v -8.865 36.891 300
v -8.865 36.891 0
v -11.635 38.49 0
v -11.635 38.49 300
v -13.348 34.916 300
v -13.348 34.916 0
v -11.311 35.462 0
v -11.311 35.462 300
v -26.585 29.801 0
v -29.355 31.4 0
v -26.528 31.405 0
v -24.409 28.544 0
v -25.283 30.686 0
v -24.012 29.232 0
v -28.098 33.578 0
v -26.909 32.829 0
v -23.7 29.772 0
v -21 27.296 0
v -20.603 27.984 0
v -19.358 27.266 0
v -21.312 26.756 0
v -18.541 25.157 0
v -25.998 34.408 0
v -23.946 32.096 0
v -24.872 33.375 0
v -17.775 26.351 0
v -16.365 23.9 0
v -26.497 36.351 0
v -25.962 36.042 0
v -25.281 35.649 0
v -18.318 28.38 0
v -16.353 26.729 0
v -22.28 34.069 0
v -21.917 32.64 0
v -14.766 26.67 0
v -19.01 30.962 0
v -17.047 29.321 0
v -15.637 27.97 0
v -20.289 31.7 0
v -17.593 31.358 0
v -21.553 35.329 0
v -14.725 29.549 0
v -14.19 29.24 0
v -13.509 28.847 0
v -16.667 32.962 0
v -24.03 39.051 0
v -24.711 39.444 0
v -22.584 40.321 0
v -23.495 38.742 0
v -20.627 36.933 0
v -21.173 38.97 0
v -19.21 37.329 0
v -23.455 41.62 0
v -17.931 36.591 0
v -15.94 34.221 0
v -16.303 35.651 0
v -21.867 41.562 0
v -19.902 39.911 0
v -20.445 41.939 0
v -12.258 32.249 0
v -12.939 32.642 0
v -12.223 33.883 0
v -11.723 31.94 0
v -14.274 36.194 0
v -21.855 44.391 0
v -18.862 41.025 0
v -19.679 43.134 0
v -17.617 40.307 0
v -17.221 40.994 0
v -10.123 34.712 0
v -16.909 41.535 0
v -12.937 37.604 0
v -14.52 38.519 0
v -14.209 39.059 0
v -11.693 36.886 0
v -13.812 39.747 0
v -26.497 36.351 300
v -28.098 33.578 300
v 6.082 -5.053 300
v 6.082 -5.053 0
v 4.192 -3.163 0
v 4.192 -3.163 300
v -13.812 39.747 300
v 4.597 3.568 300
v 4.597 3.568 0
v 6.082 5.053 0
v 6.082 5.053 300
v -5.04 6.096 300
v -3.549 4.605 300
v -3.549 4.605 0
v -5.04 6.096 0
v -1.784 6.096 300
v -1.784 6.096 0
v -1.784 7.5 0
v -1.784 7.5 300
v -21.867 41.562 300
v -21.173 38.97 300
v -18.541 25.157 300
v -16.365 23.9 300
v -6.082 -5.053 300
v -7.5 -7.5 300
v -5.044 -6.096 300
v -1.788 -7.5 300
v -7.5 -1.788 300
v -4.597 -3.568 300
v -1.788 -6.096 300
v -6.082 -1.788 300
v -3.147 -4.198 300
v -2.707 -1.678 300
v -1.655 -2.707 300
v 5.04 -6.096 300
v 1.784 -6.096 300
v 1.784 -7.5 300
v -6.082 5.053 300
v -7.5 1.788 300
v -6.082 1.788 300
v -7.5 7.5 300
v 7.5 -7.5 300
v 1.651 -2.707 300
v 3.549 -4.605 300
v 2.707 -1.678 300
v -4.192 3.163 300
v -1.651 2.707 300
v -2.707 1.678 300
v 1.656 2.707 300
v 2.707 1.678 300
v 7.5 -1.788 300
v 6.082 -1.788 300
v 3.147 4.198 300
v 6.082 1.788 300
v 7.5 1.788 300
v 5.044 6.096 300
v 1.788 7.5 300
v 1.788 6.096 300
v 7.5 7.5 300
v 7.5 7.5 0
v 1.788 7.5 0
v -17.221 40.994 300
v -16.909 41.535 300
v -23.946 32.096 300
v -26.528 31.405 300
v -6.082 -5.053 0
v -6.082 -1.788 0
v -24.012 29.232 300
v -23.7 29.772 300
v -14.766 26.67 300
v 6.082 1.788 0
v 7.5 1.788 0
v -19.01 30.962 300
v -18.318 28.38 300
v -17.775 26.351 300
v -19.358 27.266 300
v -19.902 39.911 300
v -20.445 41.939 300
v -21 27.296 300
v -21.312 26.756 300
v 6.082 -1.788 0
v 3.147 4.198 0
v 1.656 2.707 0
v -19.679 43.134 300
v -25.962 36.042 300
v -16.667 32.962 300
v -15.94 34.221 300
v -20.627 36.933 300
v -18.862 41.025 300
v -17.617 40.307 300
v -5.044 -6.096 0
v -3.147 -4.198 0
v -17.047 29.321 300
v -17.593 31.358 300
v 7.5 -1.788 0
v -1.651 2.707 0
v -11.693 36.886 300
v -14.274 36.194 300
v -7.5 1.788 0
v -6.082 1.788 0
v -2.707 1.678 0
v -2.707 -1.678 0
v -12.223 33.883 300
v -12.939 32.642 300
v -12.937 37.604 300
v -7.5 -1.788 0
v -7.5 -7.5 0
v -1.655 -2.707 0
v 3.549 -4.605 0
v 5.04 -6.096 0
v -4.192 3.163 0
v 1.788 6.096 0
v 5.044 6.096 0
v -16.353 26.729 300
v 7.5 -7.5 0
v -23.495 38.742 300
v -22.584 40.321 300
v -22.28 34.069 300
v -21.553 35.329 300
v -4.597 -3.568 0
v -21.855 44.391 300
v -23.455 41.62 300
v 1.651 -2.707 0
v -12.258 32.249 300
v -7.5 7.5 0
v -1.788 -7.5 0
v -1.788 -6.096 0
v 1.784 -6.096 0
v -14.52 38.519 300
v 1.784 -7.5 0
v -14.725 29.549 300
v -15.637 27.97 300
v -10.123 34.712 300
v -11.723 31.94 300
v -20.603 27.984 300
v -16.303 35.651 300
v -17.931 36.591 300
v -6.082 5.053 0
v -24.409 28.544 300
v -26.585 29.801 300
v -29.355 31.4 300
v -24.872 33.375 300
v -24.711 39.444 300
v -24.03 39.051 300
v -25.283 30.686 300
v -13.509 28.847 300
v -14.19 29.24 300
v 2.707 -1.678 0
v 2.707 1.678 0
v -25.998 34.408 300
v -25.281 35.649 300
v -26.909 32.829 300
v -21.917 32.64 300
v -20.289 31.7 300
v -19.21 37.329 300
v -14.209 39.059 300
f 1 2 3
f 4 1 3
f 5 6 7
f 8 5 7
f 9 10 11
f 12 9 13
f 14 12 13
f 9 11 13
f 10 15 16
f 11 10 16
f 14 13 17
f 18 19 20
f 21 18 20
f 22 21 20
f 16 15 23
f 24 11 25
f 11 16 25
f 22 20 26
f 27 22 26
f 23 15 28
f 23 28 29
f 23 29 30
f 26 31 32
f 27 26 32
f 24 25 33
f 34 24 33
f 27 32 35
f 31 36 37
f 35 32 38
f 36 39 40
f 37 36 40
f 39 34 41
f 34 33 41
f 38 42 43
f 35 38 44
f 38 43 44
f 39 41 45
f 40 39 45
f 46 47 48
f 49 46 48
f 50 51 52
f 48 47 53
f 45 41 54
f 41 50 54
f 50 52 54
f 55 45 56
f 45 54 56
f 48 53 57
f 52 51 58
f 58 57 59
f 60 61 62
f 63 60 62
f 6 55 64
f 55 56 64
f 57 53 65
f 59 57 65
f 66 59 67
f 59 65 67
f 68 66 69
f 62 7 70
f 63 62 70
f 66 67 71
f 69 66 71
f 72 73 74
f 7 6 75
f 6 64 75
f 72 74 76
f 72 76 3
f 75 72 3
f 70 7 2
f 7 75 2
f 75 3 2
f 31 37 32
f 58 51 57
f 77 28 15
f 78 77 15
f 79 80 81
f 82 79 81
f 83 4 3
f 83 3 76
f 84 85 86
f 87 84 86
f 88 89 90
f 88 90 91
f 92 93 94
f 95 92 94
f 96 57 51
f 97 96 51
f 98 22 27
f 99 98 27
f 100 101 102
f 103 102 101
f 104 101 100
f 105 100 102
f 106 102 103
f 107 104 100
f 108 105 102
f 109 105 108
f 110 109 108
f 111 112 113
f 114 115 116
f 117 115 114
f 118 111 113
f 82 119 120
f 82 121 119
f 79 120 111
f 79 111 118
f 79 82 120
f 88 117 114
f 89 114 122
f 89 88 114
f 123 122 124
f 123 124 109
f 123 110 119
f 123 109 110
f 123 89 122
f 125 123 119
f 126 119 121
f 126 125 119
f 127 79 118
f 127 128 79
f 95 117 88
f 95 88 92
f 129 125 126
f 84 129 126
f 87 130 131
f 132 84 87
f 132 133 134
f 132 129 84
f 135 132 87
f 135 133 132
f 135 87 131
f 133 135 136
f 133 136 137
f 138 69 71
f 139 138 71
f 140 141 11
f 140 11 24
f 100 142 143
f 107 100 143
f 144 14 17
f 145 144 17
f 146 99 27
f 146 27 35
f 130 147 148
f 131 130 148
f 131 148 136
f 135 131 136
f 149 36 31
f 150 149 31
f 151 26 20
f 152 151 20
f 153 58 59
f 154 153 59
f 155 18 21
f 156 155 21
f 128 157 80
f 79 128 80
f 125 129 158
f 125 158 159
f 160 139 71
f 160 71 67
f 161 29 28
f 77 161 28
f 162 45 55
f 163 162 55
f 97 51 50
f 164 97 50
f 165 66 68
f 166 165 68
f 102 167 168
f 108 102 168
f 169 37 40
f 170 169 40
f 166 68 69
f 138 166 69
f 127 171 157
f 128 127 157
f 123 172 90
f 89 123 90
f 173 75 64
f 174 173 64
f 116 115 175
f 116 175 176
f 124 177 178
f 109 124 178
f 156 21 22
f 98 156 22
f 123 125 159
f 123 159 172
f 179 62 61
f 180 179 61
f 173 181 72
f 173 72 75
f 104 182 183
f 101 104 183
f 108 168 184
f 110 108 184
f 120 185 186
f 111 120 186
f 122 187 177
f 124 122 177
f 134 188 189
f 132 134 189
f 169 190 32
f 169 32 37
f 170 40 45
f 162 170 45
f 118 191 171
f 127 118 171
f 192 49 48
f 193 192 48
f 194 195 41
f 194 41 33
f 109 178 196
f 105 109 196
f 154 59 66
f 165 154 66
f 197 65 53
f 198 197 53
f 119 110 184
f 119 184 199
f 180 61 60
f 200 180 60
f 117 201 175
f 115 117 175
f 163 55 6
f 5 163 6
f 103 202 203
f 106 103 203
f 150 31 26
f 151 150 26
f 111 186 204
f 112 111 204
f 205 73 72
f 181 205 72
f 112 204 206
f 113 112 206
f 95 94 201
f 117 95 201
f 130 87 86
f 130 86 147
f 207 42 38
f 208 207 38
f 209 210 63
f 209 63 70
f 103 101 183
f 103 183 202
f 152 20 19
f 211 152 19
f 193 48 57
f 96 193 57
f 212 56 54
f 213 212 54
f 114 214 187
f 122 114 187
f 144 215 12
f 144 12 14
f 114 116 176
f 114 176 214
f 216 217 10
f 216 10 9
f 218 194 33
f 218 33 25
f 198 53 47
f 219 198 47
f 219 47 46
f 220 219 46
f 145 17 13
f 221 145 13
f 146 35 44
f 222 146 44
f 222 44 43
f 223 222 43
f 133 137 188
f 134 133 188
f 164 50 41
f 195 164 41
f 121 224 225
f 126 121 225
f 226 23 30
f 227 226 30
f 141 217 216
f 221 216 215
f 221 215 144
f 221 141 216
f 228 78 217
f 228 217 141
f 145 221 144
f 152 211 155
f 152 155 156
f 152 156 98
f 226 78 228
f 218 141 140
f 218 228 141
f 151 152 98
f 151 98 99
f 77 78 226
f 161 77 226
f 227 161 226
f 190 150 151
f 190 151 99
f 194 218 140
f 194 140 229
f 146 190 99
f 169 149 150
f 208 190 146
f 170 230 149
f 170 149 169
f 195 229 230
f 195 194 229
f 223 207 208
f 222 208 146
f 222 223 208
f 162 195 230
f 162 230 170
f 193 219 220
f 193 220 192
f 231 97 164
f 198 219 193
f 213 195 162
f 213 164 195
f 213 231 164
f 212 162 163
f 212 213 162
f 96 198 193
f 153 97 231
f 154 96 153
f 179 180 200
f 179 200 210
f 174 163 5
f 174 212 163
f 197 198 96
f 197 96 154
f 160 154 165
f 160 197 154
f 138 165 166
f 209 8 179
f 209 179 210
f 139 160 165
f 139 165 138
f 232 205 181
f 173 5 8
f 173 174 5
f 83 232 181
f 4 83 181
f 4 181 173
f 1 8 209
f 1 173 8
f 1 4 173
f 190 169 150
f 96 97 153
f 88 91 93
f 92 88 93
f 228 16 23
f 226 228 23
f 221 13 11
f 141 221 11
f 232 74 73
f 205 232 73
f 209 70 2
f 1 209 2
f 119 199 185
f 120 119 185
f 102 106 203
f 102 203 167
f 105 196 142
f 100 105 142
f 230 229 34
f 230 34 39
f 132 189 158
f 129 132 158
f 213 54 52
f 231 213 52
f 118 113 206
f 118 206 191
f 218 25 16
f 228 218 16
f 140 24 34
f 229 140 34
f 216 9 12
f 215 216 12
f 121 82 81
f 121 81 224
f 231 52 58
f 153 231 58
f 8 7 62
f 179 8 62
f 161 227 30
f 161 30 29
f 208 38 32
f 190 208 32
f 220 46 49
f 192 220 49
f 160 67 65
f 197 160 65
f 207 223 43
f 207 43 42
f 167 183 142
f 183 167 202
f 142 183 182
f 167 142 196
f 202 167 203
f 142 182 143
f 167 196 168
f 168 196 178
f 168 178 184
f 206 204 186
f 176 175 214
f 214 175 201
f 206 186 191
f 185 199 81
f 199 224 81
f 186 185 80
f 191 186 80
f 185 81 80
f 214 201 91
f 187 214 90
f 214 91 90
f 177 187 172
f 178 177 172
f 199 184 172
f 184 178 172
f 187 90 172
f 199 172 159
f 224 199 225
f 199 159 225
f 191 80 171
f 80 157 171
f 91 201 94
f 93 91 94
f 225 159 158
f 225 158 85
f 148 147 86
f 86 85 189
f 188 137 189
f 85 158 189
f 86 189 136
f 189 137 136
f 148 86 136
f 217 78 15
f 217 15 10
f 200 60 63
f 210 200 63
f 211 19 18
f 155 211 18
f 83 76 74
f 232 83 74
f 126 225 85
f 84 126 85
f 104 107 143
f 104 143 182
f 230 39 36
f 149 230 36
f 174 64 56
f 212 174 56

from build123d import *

# Parameters (mm, degrees)
F1_DEPTH = 300
F3_DEPTH = 300


with BuildPart() as f1:
    # F0 (on Top) → F1 (new body)
    with BuildSketch(Plane.XY):
        Polygon((4.984765951, -7.4999849378), (7.5000127, -7.4999849378), (7.5000127, -4.3013247407), (7.5000127, -1.7880917708), (6.7061124626, -1.7880917708), (6.0823334515, -1.7880917708), (6.0823334515, -3.6166280251), (6.0823334515, -5.0533354194), (4.1923255558, -3.1633352009), (2.7073193521, -1.6783343121), (2.7073193521, 0.2014163021), (2.7073193521, 1.6783632554), (4.5973272478, 3.5683652456), (6.0823334515, 5.0533667249), (6.0823334515, 3.2248275179), (6.0823334515, 1.7881189425), (6.8762336889, 1.7881189425), (7.5000127, 1.7881189425), (7.5000127, 4.9867779585), (7.5000127, 7.5000103378), (4.3013519123, 7.5000103378), (1.7881189425, 7.5000103378), (1.7881189425, 6.7137908075), (1.7881189425, 6.0960466378), (3.6115321662, 6.0960466378), (5.0442131834, 6.0960466378), (3.1465358011, 4.1983674838), (1.6555030237, 2.7073335253), (-0.1960830291, 2.7073335253), (-1.6509014435, 2.7073335253), (-3.5485859125, 4.6050126793), (-5.0396234142, 6.0960466378), (-3.2162119622, 6.0960466378), (-1.7835315355, 6.0960466378), (-1.7835315355, 6.8822661681), (-1.7835315355, 7.5000103378), (-4.9847470471, 7.5000103378), (-7.4999873, 7.5000103378), (-7.4999873, 4.3013507312), (-7.4999873, 1.7881189425), (-6.7060858815, 1.7881189425), (-6.0823062799, 1.7881189425), (-6.0823062799, 3.6166575589), (-6.0823062799, 5.0533667249), (-4.1923060614, 3.1633647348), (-2.7073057631, 1.6783632554), (-2.7073057631, -0.2013873588), (-2.7073057631, -1.6783343121), (-4.5973059816, -3.5683351212), (-6.0823062799, -5.0533354194), (-6.0823062799, -3.2247991652), (-6.0823062799, -1.7880917708), (-6.8762076984, -1.7880917708), (-7.4999873, -1.7880917708), (-7.4999873, -4.986751968), (-7.4999873, -7.4999849378), (-4.3013335989, -7.4999849378), (-1.7881059441, -7.4999849378), (-1.7881059441, -6.7137618642), (-1.7881059441, -6.0960147417), (-3.6115162151, -6.0960147417), (-5.0441954606, -6.0960147417), (-3.1465121727, -4.1983373594), (-1.6554752615, -2.707304582), (0.1961113819, -2.707304582), (1.6509292057, -2.707304582), (3.5486059975, -4.6049825549), (5.0396375938, -6.0960147417), (3.2162249606, -6.0960147417), (1.7835433528, -6.0960147417), (1.7835433528, -6.8822378153), (1.7835433528, -7.4999849378), align=None)
    extrude(amount=F1_DEPTH)


with BuildPart() as f3:
    # F2 (on Top) → F3 (new body)
    with BuildSketch(Plane.XY):
        Polygon((-28.0976640869, 33.5784542243), (-29.3552874614, 31.4001866429), (-26.5851664726, 29.8008565443), (-24.4086428751, 28.5442400594), (-24.0116927564, 29.2317778331), (-23.6998032509, 29.771986303), (-25.2833620988, 30.6862544301), (-26.5275872001, 31.4046081273), (-23.9457950499, 32.0964028691), (-21.9172434537, 32.6399555219), (-20.289331669, 31.7000802148), (-19.0102580873, 30.9616067381), (-18.3184722985, 28.379810892), (-17.7749263946, 26.3512570551), (-19.3584877997, 27.2655266586), (-20.6027139238, 27.9838809464), (-20.9996640426, 27.2963431727), (-21.3115535481, 26.7561347028), (-18.5414335822, 25.1568051947), (-16.3649104961, 23.9001890051), (-14.7655801023, 26.6703105053), (-13.5089636174, 28.8468341028), (-14.1898497035, 29.239943868), (-14.7248318476, 29.5488159528), (-15.6365384594, 27.9696937795), (-16.352878968, 26.7289556231), (-17.0474786324, 29.3212320214), (-17.5932355297, 31.3580212637), (-16.6674425033, 32.9615418227), (-15.9400332961, 34.2214515275), (-13.347752706, 34.916054909), (-11.3109606692, 35.4618142843), (-12.2226663952, 33.8826936452), (-12.9390066085, 32.6419560002), (-12.2581205224, 32.2488462351), (-11.7231383783, 31.9399741502), (-10.1225306226, 34.7123081062), (-8.8649104961, 36.8905700619), (-11.6350309734, 38.4898998652), (-13.8115535481, 39.7465157595), (-14.2085042574, 39.058976963), (-14.5203940582, 38.5187679816), (-12.9368331645, 37.6044986734), (-11.6926065289, 36.8861440904), (-14.2743963749, 36.1943568831), (-16.3029455297, 35.6508096399), (-17.9308573144, 36.590684947), (-19.2099308961, 37.3291584237), (-19.9017195006, 39.9109470306), (-20.4452673344, 41.9394951626), (-18.8617084865, 41.0252270355), (-17.6174833852, 40.3068733383), (-17.2205326759, 40.9944121348), (-16.9086428751, 41.5346211162), (-19.6787638639, 43.1339512148), (-21.8552874614, 44.3905676997), (-23.4546143119, 41.6204523366), (-24.7112281394, 39.443933342), (-24.0303389846, 39.0508218052), (-23.4953542834, 38.741948244), (-22.5836491479, 40.3210678602), (-21.8673095252, 41.5618044823), (-21.1727143478, 38.9695238555), (-20.6269605403, 36.9327316237), (-21.552753862, 35.3292105533), (-22.280162774, 34.0693013599), (-24.8724385026, 33.3747040365), (-26.9092260524, 32.8289488897), (-25.9975197358, 34.4080705516), (-25.2811789319, 35.6488092195), (-25.9620680866, 36.0419207562), (-26.4970527878, 36.3507943175), align=None)
    extrude(amount=F3_DEPTH)


solid = Compound([f1.part, f3.part])
